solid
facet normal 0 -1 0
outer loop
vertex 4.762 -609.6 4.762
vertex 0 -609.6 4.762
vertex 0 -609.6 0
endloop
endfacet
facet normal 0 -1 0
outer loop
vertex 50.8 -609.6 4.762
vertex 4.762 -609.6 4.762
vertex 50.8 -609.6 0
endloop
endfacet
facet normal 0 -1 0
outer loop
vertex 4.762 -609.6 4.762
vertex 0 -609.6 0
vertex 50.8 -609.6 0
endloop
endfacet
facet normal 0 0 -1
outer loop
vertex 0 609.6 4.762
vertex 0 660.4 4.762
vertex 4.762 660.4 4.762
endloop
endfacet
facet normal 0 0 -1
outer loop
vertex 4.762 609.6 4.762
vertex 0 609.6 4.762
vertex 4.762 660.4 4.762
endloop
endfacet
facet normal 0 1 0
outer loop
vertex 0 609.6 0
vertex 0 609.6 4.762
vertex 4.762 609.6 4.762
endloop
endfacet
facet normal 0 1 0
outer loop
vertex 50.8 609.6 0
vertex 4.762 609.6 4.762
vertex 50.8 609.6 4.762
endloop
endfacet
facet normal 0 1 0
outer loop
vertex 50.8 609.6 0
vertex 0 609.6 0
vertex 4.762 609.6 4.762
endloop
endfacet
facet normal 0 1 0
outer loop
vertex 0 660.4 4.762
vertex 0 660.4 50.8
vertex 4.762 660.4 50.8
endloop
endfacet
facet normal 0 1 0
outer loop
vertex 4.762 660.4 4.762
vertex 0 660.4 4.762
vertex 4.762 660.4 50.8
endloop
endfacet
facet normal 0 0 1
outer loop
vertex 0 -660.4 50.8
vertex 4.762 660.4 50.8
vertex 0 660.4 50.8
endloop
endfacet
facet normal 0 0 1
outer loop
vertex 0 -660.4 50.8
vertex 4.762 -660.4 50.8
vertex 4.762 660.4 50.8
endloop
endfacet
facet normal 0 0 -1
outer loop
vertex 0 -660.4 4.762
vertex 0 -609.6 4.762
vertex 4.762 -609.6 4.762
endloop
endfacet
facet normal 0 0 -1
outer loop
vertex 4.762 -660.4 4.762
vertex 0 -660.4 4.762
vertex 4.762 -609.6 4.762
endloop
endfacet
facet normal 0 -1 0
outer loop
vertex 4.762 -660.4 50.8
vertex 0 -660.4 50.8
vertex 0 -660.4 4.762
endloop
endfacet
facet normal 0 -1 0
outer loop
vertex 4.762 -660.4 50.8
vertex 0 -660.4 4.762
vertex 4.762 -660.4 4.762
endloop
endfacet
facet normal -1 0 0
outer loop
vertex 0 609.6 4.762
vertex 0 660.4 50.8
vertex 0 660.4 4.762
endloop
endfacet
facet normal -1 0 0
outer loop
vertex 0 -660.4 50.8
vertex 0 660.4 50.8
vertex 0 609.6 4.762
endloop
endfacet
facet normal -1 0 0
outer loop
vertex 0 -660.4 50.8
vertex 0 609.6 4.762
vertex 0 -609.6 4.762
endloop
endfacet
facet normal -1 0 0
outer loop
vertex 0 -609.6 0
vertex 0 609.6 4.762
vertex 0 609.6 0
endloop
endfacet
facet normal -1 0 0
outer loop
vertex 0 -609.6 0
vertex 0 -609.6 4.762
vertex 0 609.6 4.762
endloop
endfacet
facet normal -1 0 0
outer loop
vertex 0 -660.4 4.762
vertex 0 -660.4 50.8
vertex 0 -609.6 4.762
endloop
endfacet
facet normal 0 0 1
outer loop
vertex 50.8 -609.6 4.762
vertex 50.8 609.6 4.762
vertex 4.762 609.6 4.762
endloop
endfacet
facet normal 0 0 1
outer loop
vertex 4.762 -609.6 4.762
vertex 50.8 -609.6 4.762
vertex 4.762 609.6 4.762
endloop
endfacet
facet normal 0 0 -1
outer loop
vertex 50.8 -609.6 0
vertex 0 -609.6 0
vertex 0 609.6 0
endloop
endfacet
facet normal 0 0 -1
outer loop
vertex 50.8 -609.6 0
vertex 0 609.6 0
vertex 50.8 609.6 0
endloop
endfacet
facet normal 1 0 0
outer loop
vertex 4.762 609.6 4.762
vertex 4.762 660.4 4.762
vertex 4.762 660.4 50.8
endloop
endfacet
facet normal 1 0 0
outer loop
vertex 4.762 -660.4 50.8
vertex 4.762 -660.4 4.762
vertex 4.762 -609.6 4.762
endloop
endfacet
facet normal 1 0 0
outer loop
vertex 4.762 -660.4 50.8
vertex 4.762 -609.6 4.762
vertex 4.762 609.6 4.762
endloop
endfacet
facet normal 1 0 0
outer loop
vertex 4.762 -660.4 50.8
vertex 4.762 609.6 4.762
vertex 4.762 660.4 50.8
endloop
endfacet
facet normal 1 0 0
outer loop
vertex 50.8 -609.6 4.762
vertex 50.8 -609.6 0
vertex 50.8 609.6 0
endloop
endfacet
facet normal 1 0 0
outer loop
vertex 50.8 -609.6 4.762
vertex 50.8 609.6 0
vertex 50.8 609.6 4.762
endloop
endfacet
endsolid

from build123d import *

# Parameters (mm, degrees)
F1_DEPTH = 660.4
F2_W     = 50.8
F2_H     = 50.8
F3_DEPTH = 4.7625


with BuildPart() as f1:
    # F0 (on Front) → F1 (new body, symmetric)
    with BuildSketch(Plane.XZ):
        Polygon((0, 50.8), (0, 0), (50.8, 0), (50.8, 4.7625), (4.7625, 4.7625), (4.7625, 50.8), align=None)
    extrude(amount=F1_DEPTH, both=True)

    # F2 (on face) → F3 (cut, through all)
    with BuildSketch(Plane(origin=(0, 0, 0), x_dir=(1, 0, 0), z_dir=(0, 0, -1))):
        with Locations((25.4, 635)):
            Rectangle(F2_W, F2_H)
        with Locations((25.4, -635)):
            Rectangle(F2_W, F2_H)
    extrude(amount=-F3_DEPTH, mode=Mode.SUBTRACT)


solid = f1.part
